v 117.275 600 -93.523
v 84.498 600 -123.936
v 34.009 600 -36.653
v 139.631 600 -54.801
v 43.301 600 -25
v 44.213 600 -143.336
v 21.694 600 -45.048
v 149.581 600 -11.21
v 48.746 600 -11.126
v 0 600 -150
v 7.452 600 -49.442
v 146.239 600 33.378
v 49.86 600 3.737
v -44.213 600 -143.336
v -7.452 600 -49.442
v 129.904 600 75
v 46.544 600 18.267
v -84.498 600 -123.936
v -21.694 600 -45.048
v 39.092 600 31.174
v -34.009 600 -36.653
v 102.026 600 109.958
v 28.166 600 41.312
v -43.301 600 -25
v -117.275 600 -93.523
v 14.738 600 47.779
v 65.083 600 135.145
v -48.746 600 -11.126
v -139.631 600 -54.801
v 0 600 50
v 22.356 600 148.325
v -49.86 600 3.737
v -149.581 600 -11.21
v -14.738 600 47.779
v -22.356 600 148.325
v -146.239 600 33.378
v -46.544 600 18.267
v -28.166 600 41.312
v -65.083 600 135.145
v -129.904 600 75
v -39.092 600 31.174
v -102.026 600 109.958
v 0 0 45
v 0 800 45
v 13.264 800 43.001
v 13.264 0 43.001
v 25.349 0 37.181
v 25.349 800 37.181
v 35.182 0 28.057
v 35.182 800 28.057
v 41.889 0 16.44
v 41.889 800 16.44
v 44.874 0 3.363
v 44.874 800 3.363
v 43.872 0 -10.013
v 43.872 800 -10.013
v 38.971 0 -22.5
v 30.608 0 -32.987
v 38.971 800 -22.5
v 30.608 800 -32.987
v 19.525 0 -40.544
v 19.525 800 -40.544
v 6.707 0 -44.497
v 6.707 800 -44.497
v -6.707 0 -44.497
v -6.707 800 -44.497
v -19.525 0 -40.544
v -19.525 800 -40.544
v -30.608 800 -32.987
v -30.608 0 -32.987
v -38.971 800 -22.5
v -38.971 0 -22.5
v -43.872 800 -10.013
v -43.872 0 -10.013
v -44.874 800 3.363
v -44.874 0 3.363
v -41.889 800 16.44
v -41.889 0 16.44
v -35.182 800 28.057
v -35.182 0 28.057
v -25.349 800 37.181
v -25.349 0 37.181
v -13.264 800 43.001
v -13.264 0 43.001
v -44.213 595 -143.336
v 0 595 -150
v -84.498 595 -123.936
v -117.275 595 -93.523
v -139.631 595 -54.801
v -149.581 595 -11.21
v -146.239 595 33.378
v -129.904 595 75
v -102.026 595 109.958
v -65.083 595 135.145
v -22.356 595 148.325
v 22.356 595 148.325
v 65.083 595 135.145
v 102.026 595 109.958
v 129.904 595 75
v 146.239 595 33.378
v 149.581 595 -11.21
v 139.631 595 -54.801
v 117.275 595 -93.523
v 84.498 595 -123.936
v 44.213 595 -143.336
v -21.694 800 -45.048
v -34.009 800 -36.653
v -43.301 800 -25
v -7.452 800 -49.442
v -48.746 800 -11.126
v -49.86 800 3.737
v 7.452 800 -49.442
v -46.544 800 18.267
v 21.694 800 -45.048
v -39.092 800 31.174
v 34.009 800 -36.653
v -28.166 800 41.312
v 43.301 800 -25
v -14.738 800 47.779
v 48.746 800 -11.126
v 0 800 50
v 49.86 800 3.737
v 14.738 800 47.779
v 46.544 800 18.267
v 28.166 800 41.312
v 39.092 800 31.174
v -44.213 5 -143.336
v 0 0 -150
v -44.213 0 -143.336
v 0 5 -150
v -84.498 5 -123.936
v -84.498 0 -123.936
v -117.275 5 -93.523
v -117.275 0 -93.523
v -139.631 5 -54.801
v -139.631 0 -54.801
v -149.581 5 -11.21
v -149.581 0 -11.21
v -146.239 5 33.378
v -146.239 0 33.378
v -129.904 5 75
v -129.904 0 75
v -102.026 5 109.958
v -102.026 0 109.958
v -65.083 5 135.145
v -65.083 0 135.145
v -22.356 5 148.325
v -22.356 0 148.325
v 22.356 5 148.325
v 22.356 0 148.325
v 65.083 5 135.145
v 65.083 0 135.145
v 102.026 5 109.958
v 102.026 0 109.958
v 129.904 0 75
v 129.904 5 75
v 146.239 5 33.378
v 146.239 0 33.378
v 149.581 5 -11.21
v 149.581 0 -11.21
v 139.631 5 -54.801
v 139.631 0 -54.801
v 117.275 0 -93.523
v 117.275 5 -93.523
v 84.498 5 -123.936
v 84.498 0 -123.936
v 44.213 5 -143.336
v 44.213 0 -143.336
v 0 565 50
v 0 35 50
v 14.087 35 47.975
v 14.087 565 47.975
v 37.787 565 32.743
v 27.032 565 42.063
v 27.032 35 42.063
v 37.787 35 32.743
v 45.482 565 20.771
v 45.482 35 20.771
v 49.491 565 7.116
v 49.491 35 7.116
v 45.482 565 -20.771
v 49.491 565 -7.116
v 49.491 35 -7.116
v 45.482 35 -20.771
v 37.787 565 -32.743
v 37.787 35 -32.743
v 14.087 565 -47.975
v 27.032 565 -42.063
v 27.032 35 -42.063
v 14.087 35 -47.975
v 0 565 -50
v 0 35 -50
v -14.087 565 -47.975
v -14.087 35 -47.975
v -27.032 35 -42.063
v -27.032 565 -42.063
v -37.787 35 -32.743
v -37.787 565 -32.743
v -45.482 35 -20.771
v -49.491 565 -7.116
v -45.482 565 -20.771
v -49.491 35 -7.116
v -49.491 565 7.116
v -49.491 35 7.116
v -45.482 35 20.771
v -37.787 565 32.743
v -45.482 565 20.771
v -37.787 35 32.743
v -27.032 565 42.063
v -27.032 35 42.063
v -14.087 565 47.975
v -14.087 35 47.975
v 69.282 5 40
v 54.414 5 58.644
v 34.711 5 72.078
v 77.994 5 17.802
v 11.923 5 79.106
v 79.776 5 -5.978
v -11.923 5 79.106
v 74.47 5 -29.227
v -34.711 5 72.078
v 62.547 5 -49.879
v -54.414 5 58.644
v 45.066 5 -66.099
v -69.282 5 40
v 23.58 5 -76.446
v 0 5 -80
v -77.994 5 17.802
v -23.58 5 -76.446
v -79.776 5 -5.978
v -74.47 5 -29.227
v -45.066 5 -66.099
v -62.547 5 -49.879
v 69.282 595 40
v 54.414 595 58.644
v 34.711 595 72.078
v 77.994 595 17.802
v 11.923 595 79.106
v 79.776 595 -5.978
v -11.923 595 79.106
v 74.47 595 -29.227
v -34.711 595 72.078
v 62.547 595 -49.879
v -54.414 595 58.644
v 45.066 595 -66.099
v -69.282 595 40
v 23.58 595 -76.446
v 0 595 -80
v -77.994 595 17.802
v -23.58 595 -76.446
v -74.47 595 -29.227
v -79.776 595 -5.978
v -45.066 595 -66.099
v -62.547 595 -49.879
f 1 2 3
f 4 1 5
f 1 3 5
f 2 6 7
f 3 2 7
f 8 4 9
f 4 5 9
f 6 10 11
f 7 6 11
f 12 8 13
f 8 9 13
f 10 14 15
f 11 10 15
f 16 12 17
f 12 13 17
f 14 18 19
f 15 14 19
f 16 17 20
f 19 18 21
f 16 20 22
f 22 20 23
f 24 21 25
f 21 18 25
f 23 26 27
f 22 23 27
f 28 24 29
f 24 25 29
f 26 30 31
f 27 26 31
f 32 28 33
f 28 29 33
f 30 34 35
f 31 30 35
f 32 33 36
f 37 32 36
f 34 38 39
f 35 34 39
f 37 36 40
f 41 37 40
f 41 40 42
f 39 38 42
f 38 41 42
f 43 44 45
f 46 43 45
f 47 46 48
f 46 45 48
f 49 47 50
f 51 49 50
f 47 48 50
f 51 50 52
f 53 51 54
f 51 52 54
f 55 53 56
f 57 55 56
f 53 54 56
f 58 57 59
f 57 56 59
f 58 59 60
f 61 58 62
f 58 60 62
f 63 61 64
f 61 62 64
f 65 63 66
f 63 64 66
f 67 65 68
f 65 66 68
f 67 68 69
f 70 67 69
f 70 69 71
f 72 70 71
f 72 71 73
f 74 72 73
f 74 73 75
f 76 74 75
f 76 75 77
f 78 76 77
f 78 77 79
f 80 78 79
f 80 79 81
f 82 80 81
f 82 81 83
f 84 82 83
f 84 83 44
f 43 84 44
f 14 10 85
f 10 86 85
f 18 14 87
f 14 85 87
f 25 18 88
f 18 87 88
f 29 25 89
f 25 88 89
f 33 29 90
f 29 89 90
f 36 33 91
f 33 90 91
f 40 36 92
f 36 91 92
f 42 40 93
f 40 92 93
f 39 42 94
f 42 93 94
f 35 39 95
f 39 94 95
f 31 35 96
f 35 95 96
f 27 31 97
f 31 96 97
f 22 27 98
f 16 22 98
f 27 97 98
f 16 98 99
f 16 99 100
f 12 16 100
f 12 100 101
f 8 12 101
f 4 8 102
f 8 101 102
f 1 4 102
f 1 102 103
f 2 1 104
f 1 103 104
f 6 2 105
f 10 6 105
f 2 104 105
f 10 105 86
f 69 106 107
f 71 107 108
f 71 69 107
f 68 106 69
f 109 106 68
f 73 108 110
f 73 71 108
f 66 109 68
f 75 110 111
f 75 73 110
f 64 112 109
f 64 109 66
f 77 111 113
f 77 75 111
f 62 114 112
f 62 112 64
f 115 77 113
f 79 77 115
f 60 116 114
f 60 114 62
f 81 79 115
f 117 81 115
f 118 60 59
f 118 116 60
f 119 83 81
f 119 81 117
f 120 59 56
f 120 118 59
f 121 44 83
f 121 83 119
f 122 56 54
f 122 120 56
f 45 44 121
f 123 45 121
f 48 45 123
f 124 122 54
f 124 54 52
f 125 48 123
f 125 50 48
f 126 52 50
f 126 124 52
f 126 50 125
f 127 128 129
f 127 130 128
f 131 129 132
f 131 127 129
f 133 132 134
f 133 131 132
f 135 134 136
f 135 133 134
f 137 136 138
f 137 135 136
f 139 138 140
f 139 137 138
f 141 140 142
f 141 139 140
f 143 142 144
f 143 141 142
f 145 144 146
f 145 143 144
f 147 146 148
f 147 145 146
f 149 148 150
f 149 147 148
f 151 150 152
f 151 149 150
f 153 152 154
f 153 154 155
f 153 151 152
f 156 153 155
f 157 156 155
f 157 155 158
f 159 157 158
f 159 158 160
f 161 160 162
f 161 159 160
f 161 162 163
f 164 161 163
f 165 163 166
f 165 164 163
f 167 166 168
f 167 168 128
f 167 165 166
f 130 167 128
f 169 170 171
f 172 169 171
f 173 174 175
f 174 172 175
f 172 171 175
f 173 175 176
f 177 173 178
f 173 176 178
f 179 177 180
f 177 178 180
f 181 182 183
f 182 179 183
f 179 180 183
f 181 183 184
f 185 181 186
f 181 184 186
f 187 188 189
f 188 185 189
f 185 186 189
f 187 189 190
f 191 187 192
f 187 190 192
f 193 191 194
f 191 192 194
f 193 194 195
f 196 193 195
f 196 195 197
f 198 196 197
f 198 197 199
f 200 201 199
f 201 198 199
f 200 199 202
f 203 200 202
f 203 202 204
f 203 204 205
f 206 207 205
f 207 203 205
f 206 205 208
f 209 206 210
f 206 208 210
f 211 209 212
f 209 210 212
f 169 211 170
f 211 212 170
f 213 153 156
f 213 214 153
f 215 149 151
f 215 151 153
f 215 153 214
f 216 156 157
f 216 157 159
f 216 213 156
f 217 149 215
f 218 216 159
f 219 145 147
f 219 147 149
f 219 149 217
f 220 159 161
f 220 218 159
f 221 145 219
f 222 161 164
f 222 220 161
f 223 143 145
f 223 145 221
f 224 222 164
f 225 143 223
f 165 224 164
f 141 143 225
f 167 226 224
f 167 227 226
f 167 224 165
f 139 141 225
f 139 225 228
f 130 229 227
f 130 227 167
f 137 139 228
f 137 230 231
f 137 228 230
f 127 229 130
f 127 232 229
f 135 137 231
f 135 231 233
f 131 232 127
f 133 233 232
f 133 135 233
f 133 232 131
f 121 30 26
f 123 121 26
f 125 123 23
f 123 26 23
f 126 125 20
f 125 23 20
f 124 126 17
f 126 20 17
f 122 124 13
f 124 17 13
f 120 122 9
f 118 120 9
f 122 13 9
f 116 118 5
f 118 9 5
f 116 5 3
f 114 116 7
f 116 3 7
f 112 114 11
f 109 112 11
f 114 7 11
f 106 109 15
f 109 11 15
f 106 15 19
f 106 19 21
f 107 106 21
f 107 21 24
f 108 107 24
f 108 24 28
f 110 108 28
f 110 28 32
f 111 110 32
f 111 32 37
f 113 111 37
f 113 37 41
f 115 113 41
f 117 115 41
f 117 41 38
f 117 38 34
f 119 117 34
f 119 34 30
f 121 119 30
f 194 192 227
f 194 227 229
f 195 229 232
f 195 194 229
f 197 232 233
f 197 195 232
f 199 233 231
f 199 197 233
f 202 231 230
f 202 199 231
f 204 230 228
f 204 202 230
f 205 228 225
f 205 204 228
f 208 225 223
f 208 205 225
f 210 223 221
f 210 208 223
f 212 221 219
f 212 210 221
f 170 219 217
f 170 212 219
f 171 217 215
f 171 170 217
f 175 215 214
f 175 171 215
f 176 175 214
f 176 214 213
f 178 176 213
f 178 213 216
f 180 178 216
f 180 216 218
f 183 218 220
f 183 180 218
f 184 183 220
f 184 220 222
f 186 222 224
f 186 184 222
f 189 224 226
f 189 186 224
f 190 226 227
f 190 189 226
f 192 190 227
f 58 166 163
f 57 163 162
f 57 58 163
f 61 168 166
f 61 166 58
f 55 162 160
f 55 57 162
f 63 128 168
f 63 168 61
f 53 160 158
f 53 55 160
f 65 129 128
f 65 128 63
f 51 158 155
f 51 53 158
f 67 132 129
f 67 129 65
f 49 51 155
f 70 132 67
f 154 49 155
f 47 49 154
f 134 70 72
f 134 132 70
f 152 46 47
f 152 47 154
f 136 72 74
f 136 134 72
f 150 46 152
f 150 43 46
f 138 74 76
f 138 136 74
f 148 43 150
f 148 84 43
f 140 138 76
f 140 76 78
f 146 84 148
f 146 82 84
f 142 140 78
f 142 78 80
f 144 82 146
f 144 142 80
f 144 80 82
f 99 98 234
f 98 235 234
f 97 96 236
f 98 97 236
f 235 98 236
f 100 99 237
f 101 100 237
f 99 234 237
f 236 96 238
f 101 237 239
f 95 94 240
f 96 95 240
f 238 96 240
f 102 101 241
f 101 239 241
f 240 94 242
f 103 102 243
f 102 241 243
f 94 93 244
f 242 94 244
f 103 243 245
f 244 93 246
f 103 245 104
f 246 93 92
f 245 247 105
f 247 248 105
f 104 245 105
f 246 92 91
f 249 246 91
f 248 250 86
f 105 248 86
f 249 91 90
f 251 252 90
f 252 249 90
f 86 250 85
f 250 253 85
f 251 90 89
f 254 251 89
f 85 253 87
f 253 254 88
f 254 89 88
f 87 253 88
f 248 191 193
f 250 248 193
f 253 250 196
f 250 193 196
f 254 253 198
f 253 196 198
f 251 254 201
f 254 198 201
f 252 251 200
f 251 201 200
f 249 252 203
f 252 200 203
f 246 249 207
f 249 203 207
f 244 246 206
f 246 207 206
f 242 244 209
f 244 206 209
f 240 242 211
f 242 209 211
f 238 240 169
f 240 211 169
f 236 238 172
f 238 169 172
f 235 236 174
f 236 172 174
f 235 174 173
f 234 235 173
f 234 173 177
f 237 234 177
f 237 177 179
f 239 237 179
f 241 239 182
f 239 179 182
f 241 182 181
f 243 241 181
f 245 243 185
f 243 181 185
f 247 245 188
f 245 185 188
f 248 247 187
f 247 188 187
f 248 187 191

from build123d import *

# Parameters (mm, degrees)
SKETCH1_R           = 50
BOSS_EXTRUDE1_DEPTH = 800
SKETCH3_R           = 45
CUT_EXTRUDE1_DEPTH  = 828.647267862


with BuildPart() as part:
    # Sketch1 → Boss-Extrude1 (new body)
    with BuildSketch(Plane(origin=(0, 0, 0), x_dir=(1, 0, 0), z_dir=(0, 1, 0))):
        with Locations(Location((0, 0, 0), (0, 0, 270))):
            Circle(SKETCH1_R)
    extrude(amount=BOSS_EXTRUDE1_DEPTH)

    # Sketch2 → Revolve1 (revolve)
    with BuildSketch(Plane.XY, mode=Mode.PRIVATE) as revolve1_sk:
        Polygon((0, 0), (150, 0), (150, 5), (80, 5), (0, 85), align=None)
        Polygon((0, 600), (150, 600), (150, 595), (80, 595), (0, 515), align=None)
    revolve(revolve1_sk.sketch.rotate(Axis((0, -31.169915786, 0), (0, 1, 0)), 90), axis=Axis((0, -31.169915786, 0), (0, 1, 0)))

    # Sketch3 → Cut-Extrude1 (cut, through all)
    with BuildSketch(Plane(origin=(0, 800, 0), x_dir=(1, 0, 0), z_dir=(0, 1, 0))):
        with Locations(Location((0, 0, 0), (0, 0, 270))):
            Circle(SKETCH3_R)
    extrude(amount=-CUT_EXTRUDE1_DEPTH, mode=Mode.SUBTRACT)


solid = part.part
